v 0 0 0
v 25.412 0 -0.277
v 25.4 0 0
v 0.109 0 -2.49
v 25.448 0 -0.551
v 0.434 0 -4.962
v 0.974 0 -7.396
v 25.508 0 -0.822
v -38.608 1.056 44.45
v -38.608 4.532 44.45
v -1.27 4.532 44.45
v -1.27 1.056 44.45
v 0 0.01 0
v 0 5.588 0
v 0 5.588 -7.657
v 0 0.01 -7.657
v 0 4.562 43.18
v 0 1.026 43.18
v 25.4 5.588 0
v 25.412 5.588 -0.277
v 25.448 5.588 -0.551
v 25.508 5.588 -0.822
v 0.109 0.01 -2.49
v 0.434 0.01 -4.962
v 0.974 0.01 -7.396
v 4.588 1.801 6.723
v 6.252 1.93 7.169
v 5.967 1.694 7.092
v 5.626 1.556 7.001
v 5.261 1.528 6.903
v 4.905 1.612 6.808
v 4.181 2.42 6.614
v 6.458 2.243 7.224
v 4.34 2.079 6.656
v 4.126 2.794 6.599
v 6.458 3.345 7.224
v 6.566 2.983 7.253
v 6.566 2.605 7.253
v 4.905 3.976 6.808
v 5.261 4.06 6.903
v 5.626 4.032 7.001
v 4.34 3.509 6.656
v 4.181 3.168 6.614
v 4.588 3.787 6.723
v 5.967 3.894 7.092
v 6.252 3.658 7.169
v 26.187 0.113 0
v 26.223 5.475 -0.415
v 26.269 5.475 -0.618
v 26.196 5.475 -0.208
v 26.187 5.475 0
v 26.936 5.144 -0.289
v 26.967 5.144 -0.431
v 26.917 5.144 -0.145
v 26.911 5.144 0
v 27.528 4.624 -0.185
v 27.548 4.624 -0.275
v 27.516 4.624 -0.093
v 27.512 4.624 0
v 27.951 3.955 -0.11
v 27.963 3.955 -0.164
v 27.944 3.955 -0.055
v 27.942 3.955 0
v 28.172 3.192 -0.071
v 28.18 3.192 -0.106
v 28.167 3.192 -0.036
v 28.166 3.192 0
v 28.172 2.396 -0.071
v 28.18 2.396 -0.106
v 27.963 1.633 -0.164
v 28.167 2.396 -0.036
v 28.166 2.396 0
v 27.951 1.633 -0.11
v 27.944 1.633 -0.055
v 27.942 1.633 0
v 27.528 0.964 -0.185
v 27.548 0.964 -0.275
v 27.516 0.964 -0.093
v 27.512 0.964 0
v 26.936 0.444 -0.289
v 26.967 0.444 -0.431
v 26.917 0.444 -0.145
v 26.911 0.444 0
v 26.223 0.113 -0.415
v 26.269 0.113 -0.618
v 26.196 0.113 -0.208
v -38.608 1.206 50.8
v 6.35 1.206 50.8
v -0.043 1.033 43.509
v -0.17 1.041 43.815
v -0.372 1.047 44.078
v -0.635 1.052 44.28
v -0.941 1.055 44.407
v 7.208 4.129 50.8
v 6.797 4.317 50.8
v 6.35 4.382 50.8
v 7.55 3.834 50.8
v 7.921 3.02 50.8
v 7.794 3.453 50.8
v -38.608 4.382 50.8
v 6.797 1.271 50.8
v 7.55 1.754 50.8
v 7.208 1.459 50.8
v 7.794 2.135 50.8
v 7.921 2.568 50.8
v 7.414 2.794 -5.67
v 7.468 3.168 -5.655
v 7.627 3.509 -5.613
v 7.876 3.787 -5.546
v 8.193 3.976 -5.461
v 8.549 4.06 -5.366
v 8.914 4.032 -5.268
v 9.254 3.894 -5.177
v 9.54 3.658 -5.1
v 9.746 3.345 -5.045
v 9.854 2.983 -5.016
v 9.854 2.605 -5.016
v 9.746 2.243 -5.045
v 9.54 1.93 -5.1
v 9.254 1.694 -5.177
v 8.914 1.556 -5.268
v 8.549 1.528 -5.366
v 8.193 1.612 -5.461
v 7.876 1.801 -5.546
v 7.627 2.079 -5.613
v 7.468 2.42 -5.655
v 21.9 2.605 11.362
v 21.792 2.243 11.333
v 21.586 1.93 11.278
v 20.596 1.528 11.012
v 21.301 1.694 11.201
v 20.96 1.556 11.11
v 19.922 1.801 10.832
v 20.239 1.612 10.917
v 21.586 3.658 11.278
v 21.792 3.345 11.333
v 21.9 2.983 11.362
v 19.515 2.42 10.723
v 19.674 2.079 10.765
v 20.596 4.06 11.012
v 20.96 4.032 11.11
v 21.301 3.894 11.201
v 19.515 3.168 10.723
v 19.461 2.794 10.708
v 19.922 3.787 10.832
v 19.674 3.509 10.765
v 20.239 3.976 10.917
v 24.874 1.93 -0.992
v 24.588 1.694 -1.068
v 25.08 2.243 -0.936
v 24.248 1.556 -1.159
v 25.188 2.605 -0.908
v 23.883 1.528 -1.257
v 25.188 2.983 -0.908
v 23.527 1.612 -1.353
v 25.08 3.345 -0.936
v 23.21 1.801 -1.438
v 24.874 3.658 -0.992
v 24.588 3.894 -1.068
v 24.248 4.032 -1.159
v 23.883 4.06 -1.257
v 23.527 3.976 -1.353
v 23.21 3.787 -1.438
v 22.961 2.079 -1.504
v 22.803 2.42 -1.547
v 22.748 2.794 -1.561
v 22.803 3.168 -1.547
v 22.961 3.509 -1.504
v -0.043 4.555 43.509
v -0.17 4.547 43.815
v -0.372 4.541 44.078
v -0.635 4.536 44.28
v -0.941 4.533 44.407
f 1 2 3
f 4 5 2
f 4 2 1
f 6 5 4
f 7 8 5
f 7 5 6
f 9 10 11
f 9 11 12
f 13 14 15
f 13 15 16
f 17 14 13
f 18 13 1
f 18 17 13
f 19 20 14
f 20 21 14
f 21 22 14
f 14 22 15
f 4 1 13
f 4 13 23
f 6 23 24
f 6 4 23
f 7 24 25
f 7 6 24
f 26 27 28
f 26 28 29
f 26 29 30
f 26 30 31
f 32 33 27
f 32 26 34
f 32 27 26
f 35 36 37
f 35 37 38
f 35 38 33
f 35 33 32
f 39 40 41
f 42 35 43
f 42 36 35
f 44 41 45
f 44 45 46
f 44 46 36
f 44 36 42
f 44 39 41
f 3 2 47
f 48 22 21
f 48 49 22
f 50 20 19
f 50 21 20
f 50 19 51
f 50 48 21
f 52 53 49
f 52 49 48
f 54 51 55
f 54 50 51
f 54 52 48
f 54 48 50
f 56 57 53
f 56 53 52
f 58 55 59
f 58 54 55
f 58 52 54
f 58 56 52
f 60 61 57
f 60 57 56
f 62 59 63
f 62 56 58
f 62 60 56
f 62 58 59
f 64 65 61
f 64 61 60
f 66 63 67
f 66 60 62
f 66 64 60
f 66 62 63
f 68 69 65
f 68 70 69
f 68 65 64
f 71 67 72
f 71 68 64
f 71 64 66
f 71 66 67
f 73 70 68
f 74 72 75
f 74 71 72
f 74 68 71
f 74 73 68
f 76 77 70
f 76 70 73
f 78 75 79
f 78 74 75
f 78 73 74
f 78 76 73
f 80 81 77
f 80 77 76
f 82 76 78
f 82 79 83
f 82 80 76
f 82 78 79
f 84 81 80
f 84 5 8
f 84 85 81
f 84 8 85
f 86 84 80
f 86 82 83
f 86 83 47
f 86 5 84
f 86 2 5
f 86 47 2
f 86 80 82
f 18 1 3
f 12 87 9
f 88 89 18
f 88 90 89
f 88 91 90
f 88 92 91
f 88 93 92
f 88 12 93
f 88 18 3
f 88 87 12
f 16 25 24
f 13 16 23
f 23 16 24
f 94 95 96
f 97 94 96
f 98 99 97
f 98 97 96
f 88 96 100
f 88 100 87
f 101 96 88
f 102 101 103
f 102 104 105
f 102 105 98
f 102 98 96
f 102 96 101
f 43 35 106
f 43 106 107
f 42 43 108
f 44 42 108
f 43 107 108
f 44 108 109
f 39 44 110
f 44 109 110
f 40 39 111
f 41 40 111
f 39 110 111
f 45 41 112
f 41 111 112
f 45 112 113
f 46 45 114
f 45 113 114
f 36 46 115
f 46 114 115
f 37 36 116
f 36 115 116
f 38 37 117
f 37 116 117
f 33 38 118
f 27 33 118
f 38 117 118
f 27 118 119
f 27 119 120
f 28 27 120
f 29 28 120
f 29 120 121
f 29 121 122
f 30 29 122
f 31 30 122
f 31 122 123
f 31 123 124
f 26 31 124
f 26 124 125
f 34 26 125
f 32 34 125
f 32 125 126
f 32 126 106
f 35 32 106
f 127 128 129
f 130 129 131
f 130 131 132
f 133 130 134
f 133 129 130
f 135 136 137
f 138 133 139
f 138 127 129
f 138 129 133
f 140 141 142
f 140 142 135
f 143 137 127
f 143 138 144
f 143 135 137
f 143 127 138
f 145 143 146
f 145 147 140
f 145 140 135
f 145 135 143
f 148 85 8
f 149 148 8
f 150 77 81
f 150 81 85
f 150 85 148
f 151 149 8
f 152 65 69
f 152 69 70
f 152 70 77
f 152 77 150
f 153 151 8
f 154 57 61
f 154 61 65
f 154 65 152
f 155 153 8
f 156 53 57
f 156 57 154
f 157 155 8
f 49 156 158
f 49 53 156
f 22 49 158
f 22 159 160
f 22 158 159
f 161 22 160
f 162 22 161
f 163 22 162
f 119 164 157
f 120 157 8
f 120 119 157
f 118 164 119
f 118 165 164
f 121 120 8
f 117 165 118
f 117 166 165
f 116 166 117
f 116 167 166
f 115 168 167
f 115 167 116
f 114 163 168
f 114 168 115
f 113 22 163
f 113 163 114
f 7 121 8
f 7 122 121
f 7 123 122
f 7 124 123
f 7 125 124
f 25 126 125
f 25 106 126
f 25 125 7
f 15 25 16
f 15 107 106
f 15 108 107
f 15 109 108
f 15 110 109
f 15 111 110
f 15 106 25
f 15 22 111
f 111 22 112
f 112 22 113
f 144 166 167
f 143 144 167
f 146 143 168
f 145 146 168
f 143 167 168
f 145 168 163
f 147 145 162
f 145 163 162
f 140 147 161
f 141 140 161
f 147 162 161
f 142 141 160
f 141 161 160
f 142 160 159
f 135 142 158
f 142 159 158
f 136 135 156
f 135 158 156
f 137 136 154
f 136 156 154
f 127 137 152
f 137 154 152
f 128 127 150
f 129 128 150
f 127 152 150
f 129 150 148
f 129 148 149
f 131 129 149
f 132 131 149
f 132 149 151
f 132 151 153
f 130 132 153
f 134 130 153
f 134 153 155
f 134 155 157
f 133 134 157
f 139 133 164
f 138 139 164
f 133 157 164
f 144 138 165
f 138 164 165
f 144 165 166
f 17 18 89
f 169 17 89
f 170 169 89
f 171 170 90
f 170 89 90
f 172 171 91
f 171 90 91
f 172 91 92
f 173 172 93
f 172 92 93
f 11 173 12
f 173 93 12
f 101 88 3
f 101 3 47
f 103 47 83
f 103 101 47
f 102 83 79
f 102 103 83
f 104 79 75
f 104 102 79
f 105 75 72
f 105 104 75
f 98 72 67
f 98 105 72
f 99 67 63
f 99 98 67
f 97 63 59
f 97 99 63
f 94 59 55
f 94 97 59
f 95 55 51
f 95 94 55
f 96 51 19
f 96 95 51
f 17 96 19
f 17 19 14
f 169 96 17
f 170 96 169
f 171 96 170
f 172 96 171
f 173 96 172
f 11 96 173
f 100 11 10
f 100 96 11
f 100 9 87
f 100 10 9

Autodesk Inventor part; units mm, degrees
ref_plane "YZ Plane" through (0, 0, 0) normal (1, 0, 0) x (0, 1, 0)
ref_plane "XZ Plane" through (0, 0, 0) normal (0, 1, 0) x (-1, 0, 0)
sketch "Sketch2" plane through (0, 0, 0) normal (0, 0, 1) x (1, 0, 0)
  line L0 (0, 0) -> (25.4, 0)
  line L1 (25.4, 0) -> (25.4, 5.588)
  line L2 (25.4, 5.588) -> (0, 5.588)
  line L3 (0, 5.588) -> (0, 0)
  arc A0 (25.4, 0) -> (25.4, 5.588) centre (25.4, 2.794) ccw
  dimension "d0" = 25.4
  dimension "d1" = 5.588
ref_plane "Work Plane1" through (0, 0, 50.8) normal (0, 0, 1) x (1, 0, 0)
sketch "Sketch3" plane through (0, 0, 50.8) normal (0, 0, 1) x (1, 0, 0)
  line L0 (0, 1.2065) -> (6.35, 1.2065)
  line L1 (6.35, 1.2065) -> (6.35, 4.3815)
  line L2 (6.35, 4.3815) -> (0, 4.3815)
  line L3 (0, 4.3815) -> (0, 1.2065)
  arc A0 (6.35, 1.2065) -> (6.35, 4.3815) centre (6.35, 2.794) ccw
  point P0 (0, 0)
  dimension "d3" = 6.35
  dimension "d4" = 3.175
  dimension "d5" = 1.2065
loft "Loft1" add profiles "Sketch2", "Sketch3"
sketch "Sketch4" plane through (0, 0, 0) normal (-1, 0, 0) x (0, 0, 1)
  line L0 (0, 5.588) -> (0, 0) projected
  line L1 (0, 0) -> (50.8, 1.2065) projected
  line L2 (50.8, 4.3815) -> (50.8, 1.2065) projected
  line L3 (0, 5.588) -> (50.8, 4.3815) projected
  line L4 (0, 5.588) -> (50.8, 4.3815) projected
  line L5 (44.45, 4.5323) -> (44.45, 1.0557)
  line L6 (50.8, 1.2065) -> (0, 0) projected
  dimension "d10" = 6.35
extrude "Extrusion1" add sketch "Sketch4" along normal blind 38.608 contours L3 L2 L1 L5
sketch "Sketch5" plane through (25.4, 5.588, 0) normal (0, 0, -1) x (-1, 0, 0)
  line L0 (25.4, 0) -> (25.4, -5.588) projected
  line L1 (0, 0) -> (25.4, 0) projected
  arc A0 (0, 0) -> (0, -5.588) centre (0, -2.794) ccw projected
  line L2 (25.4, -5.588) -> (0, -5.588) projected
  line L3 (25.4, 0) -> (25.4, -5.588) projected
  line L4 (25.4, 0) -> (36.1487, 0)
  line L5 (36.1487, 0) -> (36.1487, -5.5776)
  line L6 (36.1487, -5.5776) -> (25.4, -5.5776)
  line L7 (25.4, -5.5776) -> (25.4, 0)
  line L8 (-3.175, -0.1076) -> (-3.175, -7.007)
  line L9 (25.4, -5.588) -> (0, -5.588) projected
revolve "Revolution1" add sketch "Sketch5" angle 15 about axis through (28.575, 5.4804, 0) along (0, -1, 0)
sketch "Sketch7" plane through (-10.7487, 5.588, 0) normal (0, 1, 0) x (1, 0, 0)
  line L0 (0, 0) -> (10.7487, 0) projected
  line L1 (36.1487, 0) -> (10.7487, 0) projected
  arc A0 (36.2569, 0.8218) -> (36.1487, 0) centre (39.3237, 0) ccw projected
  line L2 (1.3399, 10.1777) -> (36.2569, 0.8218) projected
  arc A1 (1.3399, 10.1777) -> (0, 0) centre (39.3237, 0) ccw projected
  line L3 (10.7487, 0) -> (10.7487, -44.45) projected
  line L4 (10.7487, 0) -> (-2.0556, 0)
  line L5 (-2.0556, 0) -> (-2.0556, 10.6947)
  line L6 (-2.0556, 10.6947) -> (10.7487, 10.6947)
  line L7 (10.7487, 10.6947) -> (10.7487, 0)
extrude "Extrusion2" cut sketch "Sketch7" against normal blind 38.1 contours A1 L2 L7 L0 | L4 L5 L6 L7 L2 A1
sketch "Sketch8" plane through (0, 0.0104, -7.6566) normal (0.258819, 0, -0.9659258) x (-0.9659258, 0, -0.258819)
  line L0 (-29.583, 2.7836) -> (-24.8205, 2.7836)
  line L1 (-24.8205, 2.7836) -> (-8.9455, 2.7836)
  circle A0 centre (-24.8205, 2.7836) radius 1.27
  circle A1 centre (-8.9455, 2.7836) radius 1.27
  line L2 (-26.408, -0.0104) -> (0, -0.0104) projected
  point P0 (-1.9817, -0.0104)
  point P1 (0, 0)
  dimension "d17" = 4.7625
  dimension "d18" = 15.875
  dimension "d19" = 2.54
  dimension "d20" = 2.54
  dimension "d23" = 2.794
extrude "Extrusion4" cut sketch "Sketch8" against normal blind 12.7
fillet "Fillet2" radius 1.27 1 edges at (0, 2.794, 44.45)
properties part number "DivePlanesStabilizingFins"
